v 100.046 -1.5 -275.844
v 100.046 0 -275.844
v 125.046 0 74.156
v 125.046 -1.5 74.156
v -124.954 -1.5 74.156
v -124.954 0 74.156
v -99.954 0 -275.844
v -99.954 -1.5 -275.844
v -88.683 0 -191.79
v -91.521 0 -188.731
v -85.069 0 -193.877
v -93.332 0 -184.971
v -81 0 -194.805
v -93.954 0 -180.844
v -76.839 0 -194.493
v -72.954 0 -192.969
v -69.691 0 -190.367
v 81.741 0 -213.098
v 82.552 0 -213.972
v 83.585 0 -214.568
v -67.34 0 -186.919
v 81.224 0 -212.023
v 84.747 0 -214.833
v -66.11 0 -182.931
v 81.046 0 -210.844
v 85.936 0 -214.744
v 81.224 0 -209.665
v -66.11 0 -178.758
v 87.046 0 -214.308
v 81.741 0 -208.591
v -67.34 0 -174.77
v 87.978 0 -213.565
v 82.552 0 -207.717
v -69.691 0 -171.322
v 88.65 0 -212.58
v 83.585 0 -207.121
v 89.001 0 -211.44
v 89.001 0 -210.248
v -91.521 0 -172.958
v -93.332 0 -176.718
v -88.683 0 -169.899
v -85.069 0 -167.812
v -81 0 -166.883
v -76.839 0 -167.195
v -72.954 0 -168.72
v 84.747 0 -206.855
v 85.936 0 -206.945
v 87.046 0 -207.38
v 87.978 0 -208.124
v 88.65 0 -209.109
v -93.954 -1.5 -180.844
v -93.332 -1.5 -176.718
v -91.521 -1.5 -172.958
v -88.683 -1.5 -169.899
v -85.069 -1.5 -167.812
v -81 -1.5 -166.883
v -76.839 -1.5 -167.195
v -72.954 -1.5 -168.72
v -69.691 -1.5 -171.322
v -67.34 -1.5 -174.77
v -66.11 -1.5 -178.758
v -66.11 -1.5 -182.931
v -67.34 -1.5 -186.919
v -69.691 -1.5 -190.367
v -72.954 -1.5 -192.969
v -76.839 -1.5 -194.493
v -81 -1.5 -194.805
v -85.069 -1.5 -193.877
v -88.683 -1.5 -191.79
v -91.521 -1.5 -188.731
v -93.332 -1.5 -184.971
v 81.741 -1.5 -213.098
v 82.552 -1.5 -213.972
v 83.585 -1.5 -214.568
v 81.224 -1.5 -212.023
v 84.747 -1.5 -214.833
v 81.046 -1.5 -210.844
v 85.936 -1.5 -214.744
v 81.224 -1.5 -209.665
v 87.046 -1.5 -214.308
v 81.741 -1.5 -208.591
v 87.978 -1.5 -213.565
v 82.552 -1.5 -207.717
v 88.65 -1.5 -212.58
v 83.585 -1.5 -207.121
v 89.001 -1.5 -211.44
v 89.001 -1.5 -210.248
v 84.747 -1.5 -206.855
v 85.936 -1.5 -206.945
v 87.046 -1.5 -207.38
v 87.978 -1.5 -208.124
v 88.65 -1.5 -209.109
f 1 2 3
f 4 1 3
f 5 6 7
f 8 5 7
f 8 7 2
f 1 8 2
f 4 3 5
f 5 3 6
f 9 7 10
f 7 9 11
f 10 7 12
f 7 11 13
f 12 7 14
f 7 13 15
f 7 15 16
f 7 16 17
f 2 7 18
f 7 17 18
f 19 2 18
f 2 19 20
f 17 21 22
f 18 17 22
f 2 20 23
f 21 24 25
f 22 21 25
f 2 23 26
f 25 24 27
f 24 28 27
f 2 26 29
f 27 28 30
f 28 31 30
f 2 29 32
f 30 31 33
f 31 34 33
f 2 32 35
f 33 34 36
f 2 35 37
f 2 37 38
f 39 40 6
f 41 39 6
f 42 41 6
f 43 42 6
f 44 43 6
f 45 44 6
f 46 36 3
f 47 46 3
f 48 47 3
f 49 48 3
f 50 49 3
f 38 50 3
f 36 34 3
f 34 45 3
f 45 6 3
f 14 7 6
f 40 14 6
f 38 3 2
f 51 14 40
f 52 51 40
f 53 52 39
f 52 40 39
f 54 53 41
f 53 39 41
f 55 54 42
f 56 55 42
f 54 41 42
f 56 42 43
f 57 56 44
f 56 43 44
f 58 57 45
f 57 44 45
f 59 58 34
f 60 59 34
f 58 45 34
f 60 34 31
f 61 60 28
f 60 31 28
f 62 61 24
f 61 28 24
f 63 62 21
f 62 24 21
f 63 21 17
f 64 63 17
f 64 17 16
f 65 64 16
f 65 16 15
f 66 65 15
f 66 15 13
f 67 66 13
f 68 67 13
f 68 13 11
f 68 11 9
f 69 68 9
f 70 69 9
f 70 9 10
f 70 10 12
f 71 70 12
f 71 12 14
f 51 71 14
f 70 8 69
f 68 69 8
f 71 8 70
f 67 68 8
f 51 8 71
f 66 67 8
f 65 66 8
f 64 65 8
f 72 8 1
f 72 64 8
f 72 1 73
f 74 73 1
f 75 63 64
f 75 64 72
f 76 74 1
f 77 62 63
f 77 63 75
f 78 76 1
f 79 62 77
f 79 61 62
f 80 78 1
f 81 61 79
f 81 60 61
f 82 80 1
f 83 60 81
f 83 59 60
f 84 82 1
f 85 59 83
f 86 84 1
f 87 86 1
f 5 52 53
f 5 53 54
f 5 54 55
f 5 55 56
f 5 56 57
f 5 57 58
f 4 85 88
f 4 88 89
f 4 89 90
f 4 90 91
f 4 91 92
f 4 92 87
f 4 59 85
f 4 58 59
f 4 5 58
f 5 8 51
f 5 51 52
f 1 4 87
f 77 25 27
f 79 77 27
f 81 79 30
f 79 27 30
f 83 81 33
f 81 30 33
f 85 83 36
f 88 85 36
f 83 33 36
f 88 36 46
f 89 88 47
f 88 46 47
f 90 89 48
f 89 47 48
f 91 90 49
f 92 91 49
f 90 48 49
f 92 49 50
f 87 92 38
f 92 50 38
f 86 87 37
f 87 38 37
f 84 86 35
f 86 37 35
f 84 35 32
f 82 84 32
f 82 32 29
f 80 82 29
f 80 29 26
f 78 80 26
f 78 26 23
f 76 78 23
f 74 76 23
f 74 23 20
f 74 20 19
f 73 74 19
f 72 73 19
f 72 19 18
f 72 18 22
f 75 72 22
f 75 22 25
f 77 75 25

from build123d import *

# Parameters (mm, degrees)
F1_DEPTH = 1.5
F3_D     = 28
F4_D     = 8


with BuildPart() as f1:
    # F0 (on Front) → F1 (new body)
    with BuildSketch(Plane.XZ):
        Polygon((125.04598, 74.155715), (0.04598, 74.155715), (0.04598, -275.844285), (100.04598, -275.844285), align=None)
        Polygon((0.04598, -275.844285), (0.04598, 74.155715), (-124.95402, 74.155715), (-99.95402, -275.844285), align=None)
    extrude(amount=F1_DEPTH)

    # F3 (through all)
    with Locations(Plane.XZ.offset(1.5)):
        with Locations((-79.95402, -180.844285)):
            Hole(F3_D / 2)

    # F4 (through all)
    with Locations(Plane.XZ.offset(1.5)):
        with Locations((85.04598, -210.844285)):
            Hole(F4_D / 2)


solid = f1.part
